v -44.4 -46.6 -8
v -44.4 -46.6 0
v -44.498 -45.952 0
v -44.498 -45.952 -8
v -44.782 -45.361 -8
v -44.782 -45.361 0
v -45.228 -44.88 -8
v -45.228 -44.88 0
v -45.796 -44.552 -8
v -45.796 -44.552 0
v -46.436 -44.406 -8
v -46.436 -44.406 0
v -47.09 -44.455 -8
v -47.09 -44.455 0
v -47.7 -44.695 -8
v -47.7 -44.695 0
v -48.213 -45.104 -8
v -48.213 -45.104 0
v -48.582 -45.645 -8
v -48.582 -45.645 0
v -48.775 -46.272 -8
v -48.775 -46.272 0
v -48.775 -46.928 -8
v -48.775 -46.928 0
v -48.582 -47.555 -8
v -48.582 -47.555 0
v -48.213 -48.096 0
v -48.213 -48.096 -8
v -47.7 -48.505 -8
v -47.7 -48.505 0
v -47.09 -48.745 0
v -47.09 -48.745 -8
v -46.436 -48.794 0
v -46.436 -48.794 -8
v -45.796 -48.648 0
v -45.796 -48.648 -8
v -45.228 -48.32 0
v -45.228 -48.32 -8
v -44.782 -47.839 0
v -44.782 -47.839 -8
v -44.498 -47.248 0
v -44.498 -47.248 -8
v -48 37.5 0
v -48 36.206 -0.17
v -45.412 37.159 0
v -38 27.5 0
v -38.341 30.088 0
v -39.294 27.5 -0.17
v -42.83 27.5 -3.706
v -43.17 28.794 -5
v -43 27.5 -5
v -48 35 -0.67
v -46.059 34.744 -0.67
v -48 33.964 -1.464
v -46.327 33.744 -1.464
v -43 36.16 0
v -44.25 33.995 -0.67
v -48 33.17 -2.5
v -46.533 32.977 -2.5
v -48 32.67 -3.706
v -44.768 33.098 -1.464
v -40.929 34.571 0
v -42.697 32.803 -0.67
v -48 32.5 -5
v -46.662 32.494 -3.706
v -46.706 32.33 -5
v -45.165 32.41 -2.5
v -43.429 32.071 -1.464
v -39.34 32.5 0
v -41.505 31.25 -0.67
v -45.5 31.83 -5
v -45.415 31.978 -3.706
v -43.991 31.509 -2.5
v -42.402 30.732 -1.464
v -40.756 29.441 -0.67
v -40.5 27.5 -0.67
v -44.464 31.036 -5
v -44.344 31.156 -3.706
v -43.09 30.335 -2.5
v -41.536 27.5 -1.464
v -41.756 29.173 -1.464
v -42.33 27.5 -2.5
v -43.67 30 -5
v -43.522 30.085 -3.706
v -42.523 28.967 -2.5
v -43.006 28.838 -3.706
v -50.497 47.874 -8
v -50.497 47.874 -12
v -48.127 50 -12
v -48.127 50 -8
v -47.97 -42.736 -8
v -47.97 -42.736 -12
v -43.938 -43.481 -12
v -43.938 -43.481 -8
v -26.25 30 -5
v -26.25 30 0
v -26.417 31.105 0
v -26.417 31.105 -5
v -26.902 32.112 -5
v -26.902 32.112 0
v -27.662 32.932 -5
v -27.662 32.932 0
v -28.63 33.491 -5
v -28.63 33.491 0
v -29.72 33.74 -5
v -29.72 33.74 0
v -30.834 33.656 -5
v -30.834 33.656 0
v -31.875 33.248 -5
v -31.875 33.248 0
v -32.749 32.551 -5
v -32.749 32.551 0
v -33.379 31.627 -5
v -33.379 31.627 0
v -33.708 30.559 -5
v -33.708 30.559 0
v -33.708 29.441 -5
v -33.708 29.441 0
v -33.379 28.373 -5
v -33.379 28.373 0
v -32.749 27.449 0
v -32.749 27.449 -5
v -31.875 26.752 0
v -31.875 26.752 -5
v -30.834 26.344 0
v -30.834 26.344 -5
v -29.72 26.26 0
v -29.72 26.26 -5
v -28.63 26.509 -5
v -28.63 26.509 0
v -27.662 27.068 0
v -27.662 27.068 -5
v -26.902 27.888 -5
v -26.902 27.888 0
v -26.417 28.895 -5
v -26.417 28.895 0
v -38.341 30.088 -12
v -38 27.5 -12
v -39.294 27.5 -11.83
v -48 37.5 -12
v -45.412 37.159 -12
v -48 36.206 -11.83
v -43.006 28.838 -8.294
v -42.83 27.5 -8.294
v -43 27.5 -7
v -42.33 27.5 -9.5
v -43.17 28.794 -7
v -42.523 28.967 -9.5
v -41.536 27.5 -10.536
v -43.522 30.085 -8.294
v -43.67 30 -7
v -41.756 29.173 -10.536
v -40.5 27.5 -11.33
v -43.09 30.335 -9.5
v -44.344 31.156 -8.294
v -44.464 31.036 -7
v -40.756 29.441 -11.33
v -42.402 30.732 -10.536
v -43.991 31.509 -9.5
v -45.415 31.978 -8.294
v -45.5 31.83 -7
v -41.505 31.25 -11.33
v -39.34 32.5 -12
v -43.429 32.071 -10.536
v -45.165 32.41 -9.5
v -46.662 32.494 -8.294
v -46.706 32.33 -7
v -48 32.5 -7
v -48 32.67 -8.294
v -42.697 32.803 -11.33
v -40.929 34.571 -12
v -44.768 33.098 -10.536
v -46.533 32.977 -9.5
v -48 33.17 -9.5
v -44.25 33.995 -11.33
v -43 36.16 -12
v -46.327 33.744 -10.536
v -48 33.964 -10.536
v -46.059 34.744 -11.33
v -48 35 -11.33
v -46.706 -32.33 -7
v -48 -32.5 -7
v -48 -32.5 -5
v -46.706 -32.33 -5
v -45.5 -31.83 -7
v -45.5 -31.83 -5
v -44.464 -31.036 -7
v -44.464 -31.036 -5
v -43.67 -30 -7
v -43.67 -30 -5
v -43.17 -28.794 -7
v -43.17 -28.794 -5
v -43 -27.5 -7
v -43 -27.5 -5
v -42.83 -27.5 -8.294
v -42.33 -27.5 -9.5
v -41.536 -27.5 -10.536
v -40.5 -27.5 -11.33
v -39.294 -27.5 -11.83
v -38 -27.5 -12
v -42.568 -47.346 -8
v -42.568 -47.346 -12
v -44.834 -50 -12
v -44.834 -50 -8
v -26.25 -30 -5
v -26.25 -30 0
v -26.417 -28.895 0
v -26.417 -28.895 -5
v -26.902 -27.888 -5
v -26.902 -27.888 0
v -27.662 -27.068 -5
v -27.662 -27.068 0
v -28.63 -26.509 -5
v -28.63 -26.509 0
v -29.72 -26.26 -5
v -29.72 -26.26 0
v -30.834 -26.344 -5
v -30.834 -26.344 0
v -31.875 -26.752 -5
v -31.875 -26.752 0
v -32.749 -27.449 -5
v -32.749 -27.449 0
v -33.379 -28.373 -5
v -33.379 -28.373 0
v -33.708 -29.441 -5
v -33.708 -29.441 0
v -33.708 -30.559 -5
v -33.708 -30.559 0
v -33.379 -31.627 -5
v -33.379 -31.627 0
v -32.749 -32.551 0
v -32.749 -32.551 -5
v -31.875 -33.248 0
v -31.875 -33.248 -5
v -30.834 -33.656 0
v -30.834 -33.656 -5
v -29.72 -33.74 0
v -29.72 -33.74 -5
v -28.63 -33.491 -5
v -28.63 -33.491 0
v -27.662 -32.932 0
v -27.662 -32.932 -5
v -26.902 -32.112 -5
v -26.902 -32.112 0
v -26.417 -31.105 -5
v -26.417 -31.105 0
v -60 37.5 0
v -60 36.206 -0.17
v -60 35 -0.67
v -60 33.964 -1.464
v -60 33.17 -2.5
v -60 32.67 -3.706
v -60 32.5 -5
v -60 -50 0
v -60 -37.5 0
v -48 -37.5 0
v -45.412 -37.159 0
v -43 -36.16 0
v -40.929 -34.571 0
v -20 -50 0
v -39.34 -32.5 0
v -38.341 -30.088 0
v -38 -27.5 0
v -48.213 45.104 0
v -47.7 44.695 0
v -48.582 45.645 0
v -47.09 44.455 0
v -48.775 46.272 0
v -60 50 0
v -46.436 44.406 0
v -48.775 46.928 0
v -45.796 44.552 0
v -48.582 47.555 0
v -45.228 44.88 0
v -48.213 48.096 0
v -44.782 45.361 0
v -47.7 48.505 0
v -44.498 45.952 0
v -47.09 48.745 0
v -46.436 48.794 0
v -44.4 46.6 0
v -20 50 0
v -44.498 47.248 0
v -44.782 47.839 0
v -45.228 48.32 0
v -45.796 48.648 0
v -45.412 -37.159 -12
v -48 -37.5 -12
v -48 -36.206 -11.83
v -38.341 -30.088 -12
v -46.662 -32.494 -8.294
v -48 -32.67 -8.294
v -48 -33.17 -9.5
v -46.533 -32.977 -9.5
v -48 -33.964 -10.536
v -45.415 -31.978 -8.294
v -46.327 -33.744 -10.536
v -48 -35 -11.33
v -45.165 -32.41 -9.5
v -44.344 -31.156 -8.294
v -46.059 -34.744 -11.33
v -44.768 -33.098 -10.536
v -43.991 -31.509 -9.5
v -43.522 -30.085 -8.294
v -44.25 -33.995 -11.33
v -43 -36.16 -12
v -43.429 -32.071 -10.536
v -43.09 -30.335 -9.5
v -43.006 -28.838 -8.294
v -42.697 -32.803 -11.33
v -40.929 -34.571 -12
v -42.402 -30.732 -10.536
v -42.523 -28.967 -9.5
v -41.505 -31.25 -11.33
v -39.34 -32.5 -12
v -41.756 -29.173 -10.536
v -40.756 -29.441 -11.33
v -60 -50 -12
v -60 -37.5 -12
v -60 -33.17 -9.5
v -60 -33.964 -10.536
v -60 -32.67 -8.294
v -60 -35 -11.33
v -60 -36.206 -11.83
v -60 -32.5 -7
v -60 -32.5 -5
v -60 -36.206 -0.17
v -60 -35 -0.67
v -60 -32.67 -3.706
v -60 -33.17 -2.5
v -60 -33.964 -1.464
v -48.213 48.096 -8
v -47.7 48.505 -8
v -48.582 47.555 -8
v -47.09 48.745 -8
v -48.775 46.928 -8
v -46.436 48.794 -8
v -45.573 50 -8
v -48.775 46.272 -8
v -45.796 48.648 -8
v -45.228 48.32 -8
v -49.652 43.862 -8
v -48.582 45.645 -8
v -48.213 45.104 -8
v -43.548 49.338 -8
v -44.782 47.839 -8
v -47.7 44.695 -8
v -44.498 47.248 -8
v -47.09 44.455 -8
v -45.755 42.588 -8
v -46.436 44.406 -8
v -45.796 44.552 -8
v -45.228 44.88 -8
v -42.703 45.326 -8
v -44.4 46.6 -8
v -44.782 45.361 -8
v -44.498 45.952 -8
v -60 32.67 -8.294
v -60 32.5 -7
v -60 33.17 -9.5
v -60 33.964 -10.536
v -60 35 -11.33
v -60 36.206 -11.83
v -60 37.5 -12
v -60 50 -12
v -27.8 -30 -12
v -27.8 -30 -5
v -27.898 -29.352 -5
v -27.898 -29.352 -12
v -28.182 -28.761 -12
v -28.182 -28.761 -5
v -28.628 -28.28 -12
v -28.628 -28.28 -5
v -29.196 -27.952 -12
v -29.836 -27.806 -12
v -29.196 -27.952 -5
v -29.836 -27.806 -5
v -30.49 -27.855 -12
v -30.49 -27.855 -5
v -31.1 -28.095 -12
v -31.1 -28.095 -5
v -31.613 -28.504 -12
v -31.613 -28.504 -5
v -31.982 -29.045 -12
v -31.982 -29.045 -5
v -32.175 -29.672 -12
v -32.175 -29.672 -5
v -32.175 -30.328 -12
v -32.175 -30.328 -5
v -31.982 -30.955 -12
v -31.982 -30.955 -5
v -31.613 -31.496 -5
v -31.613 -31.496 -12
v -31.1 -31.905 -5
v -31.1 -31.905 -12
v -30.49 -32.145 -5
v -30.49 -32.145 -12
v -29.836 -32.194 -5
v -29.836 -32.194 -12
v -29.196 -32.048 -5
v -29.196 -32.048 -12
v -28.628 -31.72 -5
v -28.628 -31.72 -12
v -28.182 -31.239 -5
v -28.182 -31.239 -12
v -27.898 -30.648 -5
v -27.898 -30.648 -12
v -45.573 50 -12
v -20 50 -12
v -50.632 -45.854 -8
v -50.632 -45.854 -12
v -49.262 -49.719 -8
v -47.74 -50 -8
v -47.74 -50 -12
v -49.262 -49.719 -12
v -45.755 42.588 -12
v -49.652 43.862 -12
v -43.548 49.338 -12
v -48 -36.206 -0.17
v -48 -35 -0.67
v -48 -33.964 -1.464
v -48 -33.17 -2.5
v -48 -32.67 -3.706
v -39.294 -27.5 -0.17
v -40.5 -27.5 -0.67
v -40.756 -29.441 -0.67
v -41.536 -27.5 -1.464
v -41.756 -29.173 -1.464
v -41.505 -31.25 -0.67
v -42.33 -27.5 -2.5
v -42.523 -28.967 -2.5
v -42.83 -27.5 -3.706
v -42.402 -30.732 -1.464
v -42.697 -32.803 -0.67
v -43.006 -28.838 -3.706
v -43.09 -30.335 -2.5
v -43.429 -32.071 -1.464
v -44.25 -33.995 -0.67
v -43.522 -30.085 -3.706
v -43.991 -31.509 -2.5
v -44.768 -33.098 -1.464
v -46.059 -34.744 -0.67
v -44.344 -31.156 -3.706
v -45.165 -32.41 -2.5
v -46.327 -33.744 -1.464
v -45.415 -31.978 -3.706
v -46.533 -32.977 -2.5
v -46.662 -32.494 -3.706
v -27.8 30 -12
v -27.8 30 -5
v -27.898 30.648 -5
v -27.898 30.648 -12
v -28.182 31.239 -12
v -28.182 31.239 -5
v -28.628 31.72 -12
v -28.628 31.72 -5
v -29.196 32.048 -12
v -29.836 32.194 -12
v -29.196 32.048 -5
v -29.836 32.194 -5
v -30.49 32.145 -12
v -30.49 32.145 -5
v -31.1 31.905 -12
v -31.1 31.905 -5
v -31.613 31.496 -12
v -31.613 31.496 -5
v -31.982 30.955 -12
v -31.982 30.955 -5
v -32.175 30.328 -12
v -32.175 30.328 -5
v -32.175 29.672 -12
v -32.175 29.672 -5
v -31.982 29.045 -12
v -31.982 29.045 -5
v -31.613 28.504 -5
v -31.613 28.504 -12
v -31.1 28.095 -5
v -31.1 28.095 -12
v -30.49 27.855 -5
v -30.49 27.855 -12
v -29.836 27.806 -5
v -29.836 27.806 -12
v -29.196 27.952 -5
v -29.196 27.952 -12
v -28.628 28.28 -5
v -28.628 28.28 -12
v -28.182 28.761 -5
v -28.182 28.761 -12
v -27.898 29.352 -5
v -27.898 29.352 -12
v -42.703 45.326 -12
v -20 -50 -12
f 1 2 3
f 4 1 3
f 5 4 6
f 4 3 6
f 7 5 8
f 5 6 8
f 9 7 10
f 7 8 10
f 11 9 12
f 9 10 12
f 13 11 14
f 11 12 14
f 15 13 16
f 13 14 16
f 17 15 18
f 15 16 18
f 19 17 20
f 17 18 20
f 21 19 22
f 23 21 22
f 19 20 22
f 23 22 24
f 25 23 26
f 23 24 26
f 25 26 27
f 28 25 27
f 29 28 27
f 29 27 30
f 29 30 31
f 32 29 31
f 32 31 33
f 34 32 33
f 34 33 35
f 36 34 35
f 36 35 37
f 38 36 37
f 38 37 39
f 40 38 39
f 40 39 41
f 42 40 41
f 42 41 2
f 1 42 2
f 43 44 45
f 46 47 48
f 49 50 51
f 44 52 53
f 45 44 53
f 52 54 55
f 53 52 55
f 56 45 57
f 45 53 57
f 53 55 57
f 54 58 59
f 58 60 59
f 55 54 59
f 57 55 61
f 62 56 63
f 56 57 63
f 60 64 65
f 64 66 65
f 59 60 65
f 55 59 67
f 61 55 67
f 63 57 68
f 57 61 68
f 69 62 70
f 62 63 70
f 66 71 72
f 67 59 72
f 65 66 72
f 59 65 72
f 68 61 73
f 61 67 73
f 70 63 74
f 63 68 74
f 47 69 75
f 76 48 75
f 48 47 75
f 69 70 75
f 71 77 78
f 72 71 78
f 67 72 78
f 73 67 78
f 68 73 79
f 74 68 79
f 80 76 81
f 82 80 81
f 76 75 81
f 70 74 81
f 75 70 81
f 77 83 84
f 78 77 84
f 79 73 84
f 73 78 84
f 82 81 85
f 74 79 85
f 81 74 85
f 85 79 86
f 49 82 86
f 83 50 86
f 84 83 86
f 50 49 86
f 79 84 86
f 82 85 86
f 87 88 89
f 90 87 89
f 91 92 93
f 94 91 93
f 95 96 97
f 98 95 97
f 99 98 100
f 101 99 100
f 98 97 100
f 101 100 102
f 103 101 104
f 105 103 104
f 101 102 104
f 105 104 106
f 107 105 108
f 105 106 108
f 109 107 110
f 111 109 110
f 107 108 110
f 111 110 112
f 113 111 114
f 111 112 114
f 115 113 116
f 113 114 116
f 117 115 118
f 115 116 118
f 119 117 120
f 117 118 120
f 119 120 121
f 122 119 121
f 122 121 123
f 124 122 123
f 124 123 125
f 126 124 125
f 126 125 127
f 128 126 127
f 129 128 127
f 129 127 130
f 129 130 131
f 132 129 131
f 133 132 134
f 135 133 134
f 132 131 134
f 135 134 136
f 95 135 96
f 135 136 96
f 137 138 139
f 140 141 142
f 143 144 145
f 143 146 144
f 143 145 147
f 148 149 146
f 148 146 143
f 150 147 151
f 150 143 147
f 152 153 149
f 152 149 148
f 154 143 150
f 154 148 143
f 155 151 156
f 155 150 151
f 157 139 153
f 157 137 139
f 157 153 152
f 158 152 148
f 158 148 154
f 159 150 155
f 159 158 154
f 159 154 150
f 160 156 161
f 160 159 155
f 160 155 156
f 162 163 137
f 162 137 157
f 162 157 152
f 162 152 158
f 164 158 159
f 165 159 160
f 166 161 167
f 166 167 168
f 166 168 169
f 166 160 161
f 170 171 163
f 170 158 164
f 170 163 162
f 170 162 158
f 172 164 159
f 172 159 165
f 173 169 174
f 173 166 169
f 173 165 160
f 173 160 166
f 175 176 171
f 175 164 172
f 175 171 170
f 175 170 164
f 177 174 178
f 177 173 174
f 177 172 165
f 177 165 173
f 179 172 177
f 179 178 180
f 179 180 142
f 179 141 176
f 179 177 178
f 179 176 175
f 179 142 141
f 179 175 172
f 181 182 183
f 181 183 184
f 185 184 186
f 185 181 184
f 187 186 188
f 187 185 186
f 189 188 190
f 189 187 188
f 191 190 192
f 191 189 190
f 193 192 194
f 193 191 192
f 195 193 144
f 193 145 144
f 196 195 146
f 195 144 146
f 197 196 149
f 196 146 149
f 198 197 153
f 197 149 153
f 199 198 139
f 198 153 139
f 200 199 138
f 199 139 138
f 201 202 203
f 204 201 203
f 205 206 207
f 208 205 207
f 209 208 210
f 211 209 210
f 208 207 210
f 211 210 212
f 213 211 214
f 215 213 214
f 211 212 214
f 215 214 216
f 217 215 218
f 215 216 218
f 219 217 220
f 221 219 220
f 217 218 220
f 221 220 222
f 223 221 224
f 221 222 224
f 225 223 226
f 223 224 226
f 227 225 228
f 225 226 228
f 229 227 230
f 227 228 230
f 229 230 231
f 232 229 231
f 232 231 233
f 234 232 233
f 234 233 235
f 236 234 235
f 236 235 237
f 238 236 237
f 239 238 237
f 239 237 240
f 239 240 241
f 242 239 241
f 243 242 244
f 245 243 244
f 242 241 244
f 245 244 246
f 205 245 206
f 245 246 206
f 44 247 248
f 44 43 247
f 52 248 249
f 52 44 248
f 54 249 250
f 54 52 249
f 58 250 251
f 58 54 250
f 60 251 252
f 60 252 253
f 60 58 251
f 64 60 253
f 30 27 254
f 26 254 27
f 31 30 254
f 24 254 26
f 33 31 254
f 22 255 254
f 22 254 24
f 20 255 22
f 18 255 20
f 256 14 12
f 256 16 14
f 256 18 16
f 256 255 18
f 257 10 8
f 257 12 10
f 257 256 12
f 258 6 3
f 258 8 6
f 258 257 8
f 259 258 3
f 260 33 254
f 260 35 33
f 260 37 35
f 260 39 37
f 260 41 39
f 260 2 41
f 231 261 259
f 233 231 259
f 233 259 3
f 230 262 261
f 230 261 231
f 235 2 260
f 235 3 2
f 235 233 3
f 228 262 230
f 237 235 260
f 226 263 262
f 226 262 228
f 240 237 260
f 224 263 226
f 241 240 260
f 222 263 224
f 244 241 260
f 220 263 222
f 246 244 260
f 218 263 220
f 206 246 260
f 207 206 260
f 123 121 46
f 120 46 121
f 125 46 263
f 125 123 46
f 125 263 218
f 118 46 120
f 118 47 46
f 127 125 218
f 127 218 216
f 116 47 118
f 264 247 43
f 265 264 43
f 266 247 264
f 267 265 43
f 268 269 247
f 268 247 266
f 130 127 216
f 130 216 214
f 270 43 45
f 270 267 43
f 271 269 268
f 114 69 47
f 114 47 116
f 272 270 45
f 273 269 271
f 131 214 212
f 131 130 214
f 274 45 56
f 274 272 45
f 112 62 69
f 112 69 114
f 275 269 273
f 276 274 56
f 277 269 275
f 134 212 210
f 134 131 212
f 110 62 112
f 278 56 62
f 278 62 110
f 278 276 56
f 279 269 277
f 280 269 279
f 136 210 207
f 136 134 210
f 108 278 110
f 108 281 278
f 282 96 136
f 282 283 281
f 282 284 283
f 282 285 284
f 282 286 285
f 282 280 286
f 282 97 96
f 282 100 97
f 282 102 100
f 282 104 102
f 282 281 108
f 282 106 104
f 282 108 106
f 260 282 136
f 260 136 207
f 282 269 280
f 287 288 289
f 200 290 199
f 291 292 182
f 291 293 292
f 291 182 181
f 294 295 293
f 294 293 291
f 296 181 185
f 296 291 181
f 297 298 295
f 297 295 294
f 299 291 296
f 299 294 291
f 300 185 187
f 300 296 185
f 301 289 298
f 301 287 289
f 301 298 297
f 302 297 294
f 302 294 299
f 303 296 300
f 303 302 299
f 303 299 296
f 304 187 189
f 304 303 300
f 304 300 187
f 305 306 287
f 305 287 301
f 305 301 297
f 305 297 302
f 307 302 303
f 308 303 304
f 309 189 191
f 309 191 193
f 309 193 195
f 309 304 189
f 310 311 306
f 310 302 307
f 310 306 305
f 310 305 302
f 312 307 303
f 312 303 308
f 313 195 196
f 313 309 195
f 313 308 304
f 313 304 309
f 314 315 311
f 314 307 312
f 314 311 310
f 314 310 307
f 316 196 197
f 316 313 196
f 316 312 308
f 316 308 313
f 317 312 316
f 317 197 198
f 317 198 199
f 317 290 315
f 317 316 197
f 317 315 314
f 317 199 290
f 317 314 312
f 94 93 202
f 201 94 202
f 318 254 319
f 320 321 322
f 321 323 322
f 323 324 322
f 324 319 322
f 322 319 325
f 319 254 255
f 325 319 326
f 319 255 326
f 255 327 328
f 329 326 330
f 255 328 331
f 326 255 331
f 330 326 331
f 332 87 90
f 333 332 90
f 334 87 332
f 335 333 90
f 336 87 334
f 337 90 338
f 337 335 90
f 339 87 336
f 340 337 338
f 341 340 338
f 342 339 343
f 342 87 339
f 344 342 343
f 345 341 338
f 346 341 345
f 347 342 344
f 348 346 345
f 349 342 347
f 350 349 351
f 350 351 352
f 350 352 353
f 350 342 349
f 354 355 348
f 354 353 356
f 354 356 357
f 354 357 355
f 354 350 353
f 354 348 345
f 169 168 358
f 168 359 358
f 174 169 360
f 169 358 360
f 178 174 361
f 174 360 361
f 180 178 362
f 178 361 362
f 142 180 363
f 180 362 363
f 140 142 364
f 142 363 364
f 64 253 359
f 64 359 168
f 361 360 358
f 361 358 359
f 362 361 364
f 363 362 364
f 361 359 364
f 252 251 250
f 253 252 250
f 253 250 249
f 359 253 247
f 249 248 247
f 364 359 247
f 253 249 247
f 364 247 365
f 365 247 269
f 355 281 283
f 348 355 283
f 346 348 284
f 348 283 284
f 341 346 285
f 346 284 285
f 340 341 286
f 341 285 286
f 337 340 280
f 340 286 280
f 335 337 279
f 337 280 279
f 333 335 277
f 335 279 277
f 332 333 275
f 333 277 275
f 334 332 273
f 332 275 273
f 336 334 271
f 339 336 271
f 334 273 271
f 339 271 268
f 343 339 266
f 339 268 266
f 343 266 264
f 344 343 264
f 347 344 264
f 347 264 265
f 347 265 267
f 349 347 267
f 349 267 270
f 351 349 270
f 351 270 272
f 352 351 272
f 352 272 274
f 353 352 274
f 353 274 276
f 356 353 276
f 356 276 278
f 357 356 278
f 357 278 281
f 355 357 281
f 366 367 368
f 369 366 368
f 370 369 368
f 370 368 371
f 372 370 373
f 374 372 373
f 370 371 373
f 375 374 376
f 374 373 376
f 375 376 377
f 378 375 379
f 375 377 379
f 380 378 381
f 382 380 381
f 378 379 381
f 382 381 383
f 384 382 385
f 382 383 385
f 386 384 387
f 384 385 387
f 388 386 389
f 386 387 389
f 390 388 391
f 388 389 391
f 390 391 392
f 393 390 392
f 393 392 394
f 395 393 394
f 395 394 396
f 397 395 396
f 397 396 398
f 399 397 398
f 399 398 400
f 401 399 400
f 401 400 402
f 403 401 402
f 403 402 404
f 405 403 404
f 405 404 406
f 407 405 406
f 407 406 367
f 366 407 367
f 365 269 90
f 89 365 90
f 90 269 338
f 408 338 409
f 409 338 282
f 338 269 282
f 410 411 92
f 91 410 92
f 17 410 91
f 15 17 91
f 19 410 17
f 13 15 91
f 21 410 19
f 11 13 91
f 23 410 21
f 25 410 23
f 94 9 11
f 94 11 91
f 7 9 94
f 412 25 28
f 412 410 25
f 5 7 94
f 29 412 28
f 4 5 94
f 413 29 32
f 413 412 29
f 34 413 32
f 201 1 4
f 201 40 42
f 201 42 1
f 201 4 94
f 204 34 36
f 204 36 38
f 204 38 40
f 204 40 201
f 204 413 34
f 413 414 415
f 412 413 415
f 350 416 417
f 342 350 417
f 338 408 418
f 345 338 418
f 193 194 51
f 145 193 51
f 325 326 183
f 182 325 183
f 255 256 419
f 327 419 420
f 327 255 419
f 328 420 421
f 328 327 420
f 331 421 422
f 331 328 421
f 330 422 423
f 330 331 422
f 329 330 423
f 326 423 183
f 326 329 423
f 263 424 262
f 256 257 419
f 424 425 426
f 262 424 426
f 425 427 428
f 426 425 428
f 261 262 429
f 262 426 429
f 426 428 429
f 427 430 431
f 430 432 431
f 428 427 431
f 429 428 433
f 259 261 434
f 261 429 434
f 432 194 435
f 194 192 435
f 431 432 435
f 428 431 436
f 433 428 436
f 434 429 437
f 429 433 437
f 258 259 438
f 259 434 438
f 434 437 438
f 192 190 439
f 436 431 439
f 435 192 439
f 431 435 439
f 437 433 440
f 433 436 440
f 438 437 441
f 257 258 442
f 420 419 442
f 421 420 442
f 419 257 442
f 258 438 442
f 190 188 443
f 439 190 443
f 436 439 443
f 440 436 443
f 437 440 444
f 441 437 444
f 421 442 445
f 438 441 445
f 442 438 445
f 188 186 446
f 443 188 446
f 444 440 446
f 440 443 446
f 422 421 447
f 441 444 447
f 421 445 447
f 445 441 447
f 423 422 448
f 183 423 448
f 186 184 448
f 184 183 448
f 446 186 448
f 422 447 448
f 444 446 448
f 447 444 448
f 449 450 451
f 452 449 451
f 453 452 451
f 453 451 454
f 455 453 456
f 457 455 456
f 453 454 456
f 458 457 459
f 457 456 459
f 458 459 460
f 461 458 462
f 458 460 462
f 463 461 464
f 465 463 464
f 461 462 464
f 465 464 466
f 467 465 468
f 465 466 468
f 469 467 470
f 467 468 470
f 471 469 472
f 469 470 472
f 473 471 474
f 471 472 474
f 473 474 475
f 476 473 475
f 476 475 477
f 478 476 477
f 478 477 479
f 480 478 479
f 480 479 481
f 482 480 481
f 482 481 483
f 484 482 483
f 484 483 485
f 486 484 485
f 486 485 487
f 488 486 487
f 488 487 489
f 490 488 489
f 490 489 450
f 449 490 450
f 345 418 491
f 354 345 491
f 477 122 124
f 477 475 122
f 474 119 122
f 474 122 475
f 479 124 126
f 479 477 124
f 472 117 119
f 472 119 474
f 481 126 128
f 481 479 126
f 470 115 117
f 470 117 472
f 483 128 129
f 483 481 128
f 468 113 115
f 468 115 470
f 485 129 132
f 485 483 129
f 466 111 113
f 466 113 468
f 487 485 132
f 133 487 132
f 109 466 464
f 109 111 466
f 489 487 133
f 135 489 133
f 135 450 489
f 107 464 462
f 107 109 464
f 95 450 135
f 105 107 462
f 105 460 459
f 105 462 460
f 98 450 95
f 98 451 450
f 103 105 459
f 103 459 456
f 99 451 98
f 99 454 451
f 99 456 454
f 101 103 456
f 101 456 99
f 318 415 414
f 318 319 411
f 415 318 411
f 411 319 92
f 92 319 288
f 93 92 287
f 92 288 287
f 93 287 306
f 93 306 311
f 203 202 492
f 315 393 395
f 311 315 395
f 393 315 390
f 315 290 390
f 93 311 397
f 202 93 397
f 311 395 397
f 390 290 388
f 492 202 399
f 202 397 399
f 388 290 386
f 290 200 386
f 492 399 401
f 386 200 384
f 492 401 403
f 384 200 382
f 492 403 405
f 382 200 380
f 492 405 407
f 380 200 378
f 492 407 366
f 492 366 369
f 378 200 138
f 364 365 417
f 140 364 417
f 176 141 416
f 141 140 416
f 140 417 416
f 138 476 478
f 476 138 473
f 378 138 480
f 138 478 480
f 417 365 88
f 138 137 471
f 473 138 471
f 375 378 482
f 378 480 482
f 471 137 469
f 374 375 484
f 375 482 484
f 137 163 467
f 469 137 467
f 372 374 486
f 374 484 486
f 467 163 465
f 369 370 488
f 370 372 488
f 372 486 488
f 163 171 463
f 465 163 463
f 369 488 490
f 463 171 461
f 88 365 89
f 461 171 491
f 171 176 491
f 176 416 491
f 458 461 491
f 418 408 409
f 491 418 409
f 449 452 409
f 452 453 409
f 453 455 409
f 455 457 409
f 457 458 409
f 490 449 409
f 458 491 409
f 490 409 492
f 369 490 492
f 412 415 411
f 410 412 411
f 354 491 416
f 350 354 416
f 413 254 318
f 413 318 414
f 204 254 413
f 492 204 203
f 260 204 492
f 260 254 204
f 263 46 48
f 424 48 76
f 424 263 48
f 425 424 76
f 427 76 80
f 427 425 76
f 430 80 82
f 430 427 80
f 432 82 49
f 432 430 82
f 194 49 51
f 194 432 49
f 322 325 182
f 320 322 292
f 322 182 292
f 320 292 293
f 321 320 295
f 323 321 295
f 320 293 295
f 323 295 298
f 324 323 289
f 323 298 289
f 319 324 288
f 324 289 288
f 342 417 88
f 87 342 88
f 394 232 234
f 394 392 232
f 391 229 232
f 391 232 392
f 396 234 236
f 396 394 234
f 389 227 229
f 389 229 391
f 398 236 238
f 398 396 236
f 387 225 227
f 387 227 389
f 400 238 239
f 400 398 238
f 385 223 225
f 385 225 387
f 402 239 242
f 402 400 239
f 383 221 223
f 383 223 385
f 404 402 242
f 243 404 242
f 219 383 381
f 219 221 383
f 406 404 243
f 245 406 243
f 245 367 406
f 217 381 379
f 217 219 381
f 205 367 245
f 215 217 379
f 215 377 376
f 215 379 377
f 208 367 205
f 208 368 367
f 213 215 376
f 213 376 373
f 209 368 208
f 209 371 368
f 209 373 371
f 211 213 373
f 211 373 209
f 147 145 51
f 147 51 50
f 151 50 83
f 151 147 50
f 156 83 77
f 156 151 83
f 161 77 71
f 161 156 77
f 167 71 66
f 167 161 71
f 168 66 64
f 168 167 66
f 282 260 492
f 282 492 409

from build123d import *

# Parameters (mm, degrees)
F0_W     = 120
F0_H     = 100
F0_R     = 2.2
F1_DEPTH = 12
F2_R     = 3.75
F3_DEPTH = 5
F5_DEPTH = 4
F6_W     = 80
F6_H     = 100
F7_DEPTH = 25
F8_W     = 17
F8_H     = 65
F9_DEPTH = 25
F10_F1_R = 5
F10_F2_R = 5
F10_F3_R = 5


with BuildPart() as f1:
    # F0 (on Top) → F1 (new body)
    with BuildSketch(Plane.XY):
        Rectangle(F0_W, F0_H)
        with Locations((-46.6, -46.6)):
            Circle(F0_R, mode=Mode.SUBTRACT)
        with Locations((-30, -30)):
            Circle(F0_R, mode=Mode.SUBTRACT)
        with Locations((46.6, -46.6)):
            Circle(F0_R, mode=Mode.SUBTRACT)
        with Locations((30, -30)):
            Circle(F0_R, mode=Mode.SUBTRACT)
        with Locations((-46.6, 46.6)):
            Circle(F0_R, mode=Mode.SUBTRACT)
        with Locations((-30, 30)):
            Circle(F0_R, mode=Mode.SUBTRACT)
        with Locations((30, 30)):
            Circle(F0_R, mode=Mode.SUBTRACT)
        with Locations((46.6, 46.6)):
            Circle(F0_R, mode=Mode.SUBTRACT)
    extrude(amount=-F1_DEPTH)

    # F2 (on face) → F3 (cut)
    with BuildSketch(Plane.XY):
        with Locations((-30, 30)):
            Circle(F2_R)
        with Locations((30, 30)):
            Circle(F2_R)
        with Locations((30, -30)):
            Circle(F2_R)
        with Locations((-30, -30)):
            Circle(F2_R)
    extrude(amount=-F3_DEPTH, mode=Mode.SUBTRACT)

    # F4 (on face) → F5 (cut)
    with BuildSketch(Plane(origin=(0, 0, -12), x_dir=(1, 0, 0), z_dir=(0, 0, -1))):
        Polygon((-43.9383677783, 43.4813923112), (-42.5683904062, 47.3457372751), (-45.2300226279, 50.4643449639), (-49.2616322217, 49.7186076888), (-50.6316095938, 45.8542627249), (-47.9699773721, 42.7356550361), align=None)
        Polygon((46.3647294593, 42.5067558376), (50.0272181581, 44.3496276538), (50.2624886989, 48.4428718162), (46.8352705407, 50.6932441624), (43.1727818419, 48.8503723462), (42.9375113011, 44.7571281838), align=None)
        Polygon((-42.702877562, -45.3262509262), (-45.754537837, -42.5881184301), (-49.651660275, -43.8618675039), (-50.497122438, -47.8737490738), (-47.445462163, -50.6118815699), (-43.548339725, -49.3381324961), align=None)
        Polygon((50.5258183882, -45.4176506509), (47.5389646216, -42.6089668707), (43.6131462335, -43.7913162197), (42.6741816118, -47.7823493491), (45.6610353784, -50.5910331293), (49.5868537665, -49.4086837803), align=None)
    extrude(amount=-F5_DEPTH, mode=Mode.SUBTRACT)

    # F6 (on face) → F7 (cut)
    with BuildSketch(Plane.XY):
        with Locations((20, 0)):
            Rectangle(F6_W, F6_H)
    extrude(amount=-F7_DEPTH, mode=Mode.SUBTRACT)

    # F8 (on face) → F9 (cut)
    with BuildSketch(Plane.XY):
        with Locations((-51.5, 0)):
            Rectangle(F8_W, F8_H)
    extrude(amount=-F9_DEPTH, mode=Mode.SUBTRACT)

    # F10: fillet of radius 5 on 5 edges, made by hand

    # F10_f1
    f10_f1_edges = [f1.edges().sort_by_distance(p)[0] for p in [
        (-43, 32.5, -6),
        (-43, -32.5, -6),
    ]]
    fillet(f10_f1_edges, radius=F10_F1_R)

    # F10_f2
    f10_f2_edges = [f1.edges().sort_by_distance(p)[0] for p in [
        (-43, 0, -12),
        (-44.4644660941, -31.0355339059, -12),
        (-44.4644660941, 31.0355339059, -12),
    ]]
    fillet(f10_f2_edges, radius=F10_F2_R)

    # F10_f3
    f10_f3_edges = [f1.edges().sort_by_distance(p)[0] for p in [
        (-54, 32.5, 0),
        (-43, 0, 0),
        (-44.4644660941, -31.0355339059, 0),
        (-44.4644660941, 31.0355339059, 0),
    ]]
    fillet(f10_f3_edges, radius=F10_F3_R)


solid = f1.part
